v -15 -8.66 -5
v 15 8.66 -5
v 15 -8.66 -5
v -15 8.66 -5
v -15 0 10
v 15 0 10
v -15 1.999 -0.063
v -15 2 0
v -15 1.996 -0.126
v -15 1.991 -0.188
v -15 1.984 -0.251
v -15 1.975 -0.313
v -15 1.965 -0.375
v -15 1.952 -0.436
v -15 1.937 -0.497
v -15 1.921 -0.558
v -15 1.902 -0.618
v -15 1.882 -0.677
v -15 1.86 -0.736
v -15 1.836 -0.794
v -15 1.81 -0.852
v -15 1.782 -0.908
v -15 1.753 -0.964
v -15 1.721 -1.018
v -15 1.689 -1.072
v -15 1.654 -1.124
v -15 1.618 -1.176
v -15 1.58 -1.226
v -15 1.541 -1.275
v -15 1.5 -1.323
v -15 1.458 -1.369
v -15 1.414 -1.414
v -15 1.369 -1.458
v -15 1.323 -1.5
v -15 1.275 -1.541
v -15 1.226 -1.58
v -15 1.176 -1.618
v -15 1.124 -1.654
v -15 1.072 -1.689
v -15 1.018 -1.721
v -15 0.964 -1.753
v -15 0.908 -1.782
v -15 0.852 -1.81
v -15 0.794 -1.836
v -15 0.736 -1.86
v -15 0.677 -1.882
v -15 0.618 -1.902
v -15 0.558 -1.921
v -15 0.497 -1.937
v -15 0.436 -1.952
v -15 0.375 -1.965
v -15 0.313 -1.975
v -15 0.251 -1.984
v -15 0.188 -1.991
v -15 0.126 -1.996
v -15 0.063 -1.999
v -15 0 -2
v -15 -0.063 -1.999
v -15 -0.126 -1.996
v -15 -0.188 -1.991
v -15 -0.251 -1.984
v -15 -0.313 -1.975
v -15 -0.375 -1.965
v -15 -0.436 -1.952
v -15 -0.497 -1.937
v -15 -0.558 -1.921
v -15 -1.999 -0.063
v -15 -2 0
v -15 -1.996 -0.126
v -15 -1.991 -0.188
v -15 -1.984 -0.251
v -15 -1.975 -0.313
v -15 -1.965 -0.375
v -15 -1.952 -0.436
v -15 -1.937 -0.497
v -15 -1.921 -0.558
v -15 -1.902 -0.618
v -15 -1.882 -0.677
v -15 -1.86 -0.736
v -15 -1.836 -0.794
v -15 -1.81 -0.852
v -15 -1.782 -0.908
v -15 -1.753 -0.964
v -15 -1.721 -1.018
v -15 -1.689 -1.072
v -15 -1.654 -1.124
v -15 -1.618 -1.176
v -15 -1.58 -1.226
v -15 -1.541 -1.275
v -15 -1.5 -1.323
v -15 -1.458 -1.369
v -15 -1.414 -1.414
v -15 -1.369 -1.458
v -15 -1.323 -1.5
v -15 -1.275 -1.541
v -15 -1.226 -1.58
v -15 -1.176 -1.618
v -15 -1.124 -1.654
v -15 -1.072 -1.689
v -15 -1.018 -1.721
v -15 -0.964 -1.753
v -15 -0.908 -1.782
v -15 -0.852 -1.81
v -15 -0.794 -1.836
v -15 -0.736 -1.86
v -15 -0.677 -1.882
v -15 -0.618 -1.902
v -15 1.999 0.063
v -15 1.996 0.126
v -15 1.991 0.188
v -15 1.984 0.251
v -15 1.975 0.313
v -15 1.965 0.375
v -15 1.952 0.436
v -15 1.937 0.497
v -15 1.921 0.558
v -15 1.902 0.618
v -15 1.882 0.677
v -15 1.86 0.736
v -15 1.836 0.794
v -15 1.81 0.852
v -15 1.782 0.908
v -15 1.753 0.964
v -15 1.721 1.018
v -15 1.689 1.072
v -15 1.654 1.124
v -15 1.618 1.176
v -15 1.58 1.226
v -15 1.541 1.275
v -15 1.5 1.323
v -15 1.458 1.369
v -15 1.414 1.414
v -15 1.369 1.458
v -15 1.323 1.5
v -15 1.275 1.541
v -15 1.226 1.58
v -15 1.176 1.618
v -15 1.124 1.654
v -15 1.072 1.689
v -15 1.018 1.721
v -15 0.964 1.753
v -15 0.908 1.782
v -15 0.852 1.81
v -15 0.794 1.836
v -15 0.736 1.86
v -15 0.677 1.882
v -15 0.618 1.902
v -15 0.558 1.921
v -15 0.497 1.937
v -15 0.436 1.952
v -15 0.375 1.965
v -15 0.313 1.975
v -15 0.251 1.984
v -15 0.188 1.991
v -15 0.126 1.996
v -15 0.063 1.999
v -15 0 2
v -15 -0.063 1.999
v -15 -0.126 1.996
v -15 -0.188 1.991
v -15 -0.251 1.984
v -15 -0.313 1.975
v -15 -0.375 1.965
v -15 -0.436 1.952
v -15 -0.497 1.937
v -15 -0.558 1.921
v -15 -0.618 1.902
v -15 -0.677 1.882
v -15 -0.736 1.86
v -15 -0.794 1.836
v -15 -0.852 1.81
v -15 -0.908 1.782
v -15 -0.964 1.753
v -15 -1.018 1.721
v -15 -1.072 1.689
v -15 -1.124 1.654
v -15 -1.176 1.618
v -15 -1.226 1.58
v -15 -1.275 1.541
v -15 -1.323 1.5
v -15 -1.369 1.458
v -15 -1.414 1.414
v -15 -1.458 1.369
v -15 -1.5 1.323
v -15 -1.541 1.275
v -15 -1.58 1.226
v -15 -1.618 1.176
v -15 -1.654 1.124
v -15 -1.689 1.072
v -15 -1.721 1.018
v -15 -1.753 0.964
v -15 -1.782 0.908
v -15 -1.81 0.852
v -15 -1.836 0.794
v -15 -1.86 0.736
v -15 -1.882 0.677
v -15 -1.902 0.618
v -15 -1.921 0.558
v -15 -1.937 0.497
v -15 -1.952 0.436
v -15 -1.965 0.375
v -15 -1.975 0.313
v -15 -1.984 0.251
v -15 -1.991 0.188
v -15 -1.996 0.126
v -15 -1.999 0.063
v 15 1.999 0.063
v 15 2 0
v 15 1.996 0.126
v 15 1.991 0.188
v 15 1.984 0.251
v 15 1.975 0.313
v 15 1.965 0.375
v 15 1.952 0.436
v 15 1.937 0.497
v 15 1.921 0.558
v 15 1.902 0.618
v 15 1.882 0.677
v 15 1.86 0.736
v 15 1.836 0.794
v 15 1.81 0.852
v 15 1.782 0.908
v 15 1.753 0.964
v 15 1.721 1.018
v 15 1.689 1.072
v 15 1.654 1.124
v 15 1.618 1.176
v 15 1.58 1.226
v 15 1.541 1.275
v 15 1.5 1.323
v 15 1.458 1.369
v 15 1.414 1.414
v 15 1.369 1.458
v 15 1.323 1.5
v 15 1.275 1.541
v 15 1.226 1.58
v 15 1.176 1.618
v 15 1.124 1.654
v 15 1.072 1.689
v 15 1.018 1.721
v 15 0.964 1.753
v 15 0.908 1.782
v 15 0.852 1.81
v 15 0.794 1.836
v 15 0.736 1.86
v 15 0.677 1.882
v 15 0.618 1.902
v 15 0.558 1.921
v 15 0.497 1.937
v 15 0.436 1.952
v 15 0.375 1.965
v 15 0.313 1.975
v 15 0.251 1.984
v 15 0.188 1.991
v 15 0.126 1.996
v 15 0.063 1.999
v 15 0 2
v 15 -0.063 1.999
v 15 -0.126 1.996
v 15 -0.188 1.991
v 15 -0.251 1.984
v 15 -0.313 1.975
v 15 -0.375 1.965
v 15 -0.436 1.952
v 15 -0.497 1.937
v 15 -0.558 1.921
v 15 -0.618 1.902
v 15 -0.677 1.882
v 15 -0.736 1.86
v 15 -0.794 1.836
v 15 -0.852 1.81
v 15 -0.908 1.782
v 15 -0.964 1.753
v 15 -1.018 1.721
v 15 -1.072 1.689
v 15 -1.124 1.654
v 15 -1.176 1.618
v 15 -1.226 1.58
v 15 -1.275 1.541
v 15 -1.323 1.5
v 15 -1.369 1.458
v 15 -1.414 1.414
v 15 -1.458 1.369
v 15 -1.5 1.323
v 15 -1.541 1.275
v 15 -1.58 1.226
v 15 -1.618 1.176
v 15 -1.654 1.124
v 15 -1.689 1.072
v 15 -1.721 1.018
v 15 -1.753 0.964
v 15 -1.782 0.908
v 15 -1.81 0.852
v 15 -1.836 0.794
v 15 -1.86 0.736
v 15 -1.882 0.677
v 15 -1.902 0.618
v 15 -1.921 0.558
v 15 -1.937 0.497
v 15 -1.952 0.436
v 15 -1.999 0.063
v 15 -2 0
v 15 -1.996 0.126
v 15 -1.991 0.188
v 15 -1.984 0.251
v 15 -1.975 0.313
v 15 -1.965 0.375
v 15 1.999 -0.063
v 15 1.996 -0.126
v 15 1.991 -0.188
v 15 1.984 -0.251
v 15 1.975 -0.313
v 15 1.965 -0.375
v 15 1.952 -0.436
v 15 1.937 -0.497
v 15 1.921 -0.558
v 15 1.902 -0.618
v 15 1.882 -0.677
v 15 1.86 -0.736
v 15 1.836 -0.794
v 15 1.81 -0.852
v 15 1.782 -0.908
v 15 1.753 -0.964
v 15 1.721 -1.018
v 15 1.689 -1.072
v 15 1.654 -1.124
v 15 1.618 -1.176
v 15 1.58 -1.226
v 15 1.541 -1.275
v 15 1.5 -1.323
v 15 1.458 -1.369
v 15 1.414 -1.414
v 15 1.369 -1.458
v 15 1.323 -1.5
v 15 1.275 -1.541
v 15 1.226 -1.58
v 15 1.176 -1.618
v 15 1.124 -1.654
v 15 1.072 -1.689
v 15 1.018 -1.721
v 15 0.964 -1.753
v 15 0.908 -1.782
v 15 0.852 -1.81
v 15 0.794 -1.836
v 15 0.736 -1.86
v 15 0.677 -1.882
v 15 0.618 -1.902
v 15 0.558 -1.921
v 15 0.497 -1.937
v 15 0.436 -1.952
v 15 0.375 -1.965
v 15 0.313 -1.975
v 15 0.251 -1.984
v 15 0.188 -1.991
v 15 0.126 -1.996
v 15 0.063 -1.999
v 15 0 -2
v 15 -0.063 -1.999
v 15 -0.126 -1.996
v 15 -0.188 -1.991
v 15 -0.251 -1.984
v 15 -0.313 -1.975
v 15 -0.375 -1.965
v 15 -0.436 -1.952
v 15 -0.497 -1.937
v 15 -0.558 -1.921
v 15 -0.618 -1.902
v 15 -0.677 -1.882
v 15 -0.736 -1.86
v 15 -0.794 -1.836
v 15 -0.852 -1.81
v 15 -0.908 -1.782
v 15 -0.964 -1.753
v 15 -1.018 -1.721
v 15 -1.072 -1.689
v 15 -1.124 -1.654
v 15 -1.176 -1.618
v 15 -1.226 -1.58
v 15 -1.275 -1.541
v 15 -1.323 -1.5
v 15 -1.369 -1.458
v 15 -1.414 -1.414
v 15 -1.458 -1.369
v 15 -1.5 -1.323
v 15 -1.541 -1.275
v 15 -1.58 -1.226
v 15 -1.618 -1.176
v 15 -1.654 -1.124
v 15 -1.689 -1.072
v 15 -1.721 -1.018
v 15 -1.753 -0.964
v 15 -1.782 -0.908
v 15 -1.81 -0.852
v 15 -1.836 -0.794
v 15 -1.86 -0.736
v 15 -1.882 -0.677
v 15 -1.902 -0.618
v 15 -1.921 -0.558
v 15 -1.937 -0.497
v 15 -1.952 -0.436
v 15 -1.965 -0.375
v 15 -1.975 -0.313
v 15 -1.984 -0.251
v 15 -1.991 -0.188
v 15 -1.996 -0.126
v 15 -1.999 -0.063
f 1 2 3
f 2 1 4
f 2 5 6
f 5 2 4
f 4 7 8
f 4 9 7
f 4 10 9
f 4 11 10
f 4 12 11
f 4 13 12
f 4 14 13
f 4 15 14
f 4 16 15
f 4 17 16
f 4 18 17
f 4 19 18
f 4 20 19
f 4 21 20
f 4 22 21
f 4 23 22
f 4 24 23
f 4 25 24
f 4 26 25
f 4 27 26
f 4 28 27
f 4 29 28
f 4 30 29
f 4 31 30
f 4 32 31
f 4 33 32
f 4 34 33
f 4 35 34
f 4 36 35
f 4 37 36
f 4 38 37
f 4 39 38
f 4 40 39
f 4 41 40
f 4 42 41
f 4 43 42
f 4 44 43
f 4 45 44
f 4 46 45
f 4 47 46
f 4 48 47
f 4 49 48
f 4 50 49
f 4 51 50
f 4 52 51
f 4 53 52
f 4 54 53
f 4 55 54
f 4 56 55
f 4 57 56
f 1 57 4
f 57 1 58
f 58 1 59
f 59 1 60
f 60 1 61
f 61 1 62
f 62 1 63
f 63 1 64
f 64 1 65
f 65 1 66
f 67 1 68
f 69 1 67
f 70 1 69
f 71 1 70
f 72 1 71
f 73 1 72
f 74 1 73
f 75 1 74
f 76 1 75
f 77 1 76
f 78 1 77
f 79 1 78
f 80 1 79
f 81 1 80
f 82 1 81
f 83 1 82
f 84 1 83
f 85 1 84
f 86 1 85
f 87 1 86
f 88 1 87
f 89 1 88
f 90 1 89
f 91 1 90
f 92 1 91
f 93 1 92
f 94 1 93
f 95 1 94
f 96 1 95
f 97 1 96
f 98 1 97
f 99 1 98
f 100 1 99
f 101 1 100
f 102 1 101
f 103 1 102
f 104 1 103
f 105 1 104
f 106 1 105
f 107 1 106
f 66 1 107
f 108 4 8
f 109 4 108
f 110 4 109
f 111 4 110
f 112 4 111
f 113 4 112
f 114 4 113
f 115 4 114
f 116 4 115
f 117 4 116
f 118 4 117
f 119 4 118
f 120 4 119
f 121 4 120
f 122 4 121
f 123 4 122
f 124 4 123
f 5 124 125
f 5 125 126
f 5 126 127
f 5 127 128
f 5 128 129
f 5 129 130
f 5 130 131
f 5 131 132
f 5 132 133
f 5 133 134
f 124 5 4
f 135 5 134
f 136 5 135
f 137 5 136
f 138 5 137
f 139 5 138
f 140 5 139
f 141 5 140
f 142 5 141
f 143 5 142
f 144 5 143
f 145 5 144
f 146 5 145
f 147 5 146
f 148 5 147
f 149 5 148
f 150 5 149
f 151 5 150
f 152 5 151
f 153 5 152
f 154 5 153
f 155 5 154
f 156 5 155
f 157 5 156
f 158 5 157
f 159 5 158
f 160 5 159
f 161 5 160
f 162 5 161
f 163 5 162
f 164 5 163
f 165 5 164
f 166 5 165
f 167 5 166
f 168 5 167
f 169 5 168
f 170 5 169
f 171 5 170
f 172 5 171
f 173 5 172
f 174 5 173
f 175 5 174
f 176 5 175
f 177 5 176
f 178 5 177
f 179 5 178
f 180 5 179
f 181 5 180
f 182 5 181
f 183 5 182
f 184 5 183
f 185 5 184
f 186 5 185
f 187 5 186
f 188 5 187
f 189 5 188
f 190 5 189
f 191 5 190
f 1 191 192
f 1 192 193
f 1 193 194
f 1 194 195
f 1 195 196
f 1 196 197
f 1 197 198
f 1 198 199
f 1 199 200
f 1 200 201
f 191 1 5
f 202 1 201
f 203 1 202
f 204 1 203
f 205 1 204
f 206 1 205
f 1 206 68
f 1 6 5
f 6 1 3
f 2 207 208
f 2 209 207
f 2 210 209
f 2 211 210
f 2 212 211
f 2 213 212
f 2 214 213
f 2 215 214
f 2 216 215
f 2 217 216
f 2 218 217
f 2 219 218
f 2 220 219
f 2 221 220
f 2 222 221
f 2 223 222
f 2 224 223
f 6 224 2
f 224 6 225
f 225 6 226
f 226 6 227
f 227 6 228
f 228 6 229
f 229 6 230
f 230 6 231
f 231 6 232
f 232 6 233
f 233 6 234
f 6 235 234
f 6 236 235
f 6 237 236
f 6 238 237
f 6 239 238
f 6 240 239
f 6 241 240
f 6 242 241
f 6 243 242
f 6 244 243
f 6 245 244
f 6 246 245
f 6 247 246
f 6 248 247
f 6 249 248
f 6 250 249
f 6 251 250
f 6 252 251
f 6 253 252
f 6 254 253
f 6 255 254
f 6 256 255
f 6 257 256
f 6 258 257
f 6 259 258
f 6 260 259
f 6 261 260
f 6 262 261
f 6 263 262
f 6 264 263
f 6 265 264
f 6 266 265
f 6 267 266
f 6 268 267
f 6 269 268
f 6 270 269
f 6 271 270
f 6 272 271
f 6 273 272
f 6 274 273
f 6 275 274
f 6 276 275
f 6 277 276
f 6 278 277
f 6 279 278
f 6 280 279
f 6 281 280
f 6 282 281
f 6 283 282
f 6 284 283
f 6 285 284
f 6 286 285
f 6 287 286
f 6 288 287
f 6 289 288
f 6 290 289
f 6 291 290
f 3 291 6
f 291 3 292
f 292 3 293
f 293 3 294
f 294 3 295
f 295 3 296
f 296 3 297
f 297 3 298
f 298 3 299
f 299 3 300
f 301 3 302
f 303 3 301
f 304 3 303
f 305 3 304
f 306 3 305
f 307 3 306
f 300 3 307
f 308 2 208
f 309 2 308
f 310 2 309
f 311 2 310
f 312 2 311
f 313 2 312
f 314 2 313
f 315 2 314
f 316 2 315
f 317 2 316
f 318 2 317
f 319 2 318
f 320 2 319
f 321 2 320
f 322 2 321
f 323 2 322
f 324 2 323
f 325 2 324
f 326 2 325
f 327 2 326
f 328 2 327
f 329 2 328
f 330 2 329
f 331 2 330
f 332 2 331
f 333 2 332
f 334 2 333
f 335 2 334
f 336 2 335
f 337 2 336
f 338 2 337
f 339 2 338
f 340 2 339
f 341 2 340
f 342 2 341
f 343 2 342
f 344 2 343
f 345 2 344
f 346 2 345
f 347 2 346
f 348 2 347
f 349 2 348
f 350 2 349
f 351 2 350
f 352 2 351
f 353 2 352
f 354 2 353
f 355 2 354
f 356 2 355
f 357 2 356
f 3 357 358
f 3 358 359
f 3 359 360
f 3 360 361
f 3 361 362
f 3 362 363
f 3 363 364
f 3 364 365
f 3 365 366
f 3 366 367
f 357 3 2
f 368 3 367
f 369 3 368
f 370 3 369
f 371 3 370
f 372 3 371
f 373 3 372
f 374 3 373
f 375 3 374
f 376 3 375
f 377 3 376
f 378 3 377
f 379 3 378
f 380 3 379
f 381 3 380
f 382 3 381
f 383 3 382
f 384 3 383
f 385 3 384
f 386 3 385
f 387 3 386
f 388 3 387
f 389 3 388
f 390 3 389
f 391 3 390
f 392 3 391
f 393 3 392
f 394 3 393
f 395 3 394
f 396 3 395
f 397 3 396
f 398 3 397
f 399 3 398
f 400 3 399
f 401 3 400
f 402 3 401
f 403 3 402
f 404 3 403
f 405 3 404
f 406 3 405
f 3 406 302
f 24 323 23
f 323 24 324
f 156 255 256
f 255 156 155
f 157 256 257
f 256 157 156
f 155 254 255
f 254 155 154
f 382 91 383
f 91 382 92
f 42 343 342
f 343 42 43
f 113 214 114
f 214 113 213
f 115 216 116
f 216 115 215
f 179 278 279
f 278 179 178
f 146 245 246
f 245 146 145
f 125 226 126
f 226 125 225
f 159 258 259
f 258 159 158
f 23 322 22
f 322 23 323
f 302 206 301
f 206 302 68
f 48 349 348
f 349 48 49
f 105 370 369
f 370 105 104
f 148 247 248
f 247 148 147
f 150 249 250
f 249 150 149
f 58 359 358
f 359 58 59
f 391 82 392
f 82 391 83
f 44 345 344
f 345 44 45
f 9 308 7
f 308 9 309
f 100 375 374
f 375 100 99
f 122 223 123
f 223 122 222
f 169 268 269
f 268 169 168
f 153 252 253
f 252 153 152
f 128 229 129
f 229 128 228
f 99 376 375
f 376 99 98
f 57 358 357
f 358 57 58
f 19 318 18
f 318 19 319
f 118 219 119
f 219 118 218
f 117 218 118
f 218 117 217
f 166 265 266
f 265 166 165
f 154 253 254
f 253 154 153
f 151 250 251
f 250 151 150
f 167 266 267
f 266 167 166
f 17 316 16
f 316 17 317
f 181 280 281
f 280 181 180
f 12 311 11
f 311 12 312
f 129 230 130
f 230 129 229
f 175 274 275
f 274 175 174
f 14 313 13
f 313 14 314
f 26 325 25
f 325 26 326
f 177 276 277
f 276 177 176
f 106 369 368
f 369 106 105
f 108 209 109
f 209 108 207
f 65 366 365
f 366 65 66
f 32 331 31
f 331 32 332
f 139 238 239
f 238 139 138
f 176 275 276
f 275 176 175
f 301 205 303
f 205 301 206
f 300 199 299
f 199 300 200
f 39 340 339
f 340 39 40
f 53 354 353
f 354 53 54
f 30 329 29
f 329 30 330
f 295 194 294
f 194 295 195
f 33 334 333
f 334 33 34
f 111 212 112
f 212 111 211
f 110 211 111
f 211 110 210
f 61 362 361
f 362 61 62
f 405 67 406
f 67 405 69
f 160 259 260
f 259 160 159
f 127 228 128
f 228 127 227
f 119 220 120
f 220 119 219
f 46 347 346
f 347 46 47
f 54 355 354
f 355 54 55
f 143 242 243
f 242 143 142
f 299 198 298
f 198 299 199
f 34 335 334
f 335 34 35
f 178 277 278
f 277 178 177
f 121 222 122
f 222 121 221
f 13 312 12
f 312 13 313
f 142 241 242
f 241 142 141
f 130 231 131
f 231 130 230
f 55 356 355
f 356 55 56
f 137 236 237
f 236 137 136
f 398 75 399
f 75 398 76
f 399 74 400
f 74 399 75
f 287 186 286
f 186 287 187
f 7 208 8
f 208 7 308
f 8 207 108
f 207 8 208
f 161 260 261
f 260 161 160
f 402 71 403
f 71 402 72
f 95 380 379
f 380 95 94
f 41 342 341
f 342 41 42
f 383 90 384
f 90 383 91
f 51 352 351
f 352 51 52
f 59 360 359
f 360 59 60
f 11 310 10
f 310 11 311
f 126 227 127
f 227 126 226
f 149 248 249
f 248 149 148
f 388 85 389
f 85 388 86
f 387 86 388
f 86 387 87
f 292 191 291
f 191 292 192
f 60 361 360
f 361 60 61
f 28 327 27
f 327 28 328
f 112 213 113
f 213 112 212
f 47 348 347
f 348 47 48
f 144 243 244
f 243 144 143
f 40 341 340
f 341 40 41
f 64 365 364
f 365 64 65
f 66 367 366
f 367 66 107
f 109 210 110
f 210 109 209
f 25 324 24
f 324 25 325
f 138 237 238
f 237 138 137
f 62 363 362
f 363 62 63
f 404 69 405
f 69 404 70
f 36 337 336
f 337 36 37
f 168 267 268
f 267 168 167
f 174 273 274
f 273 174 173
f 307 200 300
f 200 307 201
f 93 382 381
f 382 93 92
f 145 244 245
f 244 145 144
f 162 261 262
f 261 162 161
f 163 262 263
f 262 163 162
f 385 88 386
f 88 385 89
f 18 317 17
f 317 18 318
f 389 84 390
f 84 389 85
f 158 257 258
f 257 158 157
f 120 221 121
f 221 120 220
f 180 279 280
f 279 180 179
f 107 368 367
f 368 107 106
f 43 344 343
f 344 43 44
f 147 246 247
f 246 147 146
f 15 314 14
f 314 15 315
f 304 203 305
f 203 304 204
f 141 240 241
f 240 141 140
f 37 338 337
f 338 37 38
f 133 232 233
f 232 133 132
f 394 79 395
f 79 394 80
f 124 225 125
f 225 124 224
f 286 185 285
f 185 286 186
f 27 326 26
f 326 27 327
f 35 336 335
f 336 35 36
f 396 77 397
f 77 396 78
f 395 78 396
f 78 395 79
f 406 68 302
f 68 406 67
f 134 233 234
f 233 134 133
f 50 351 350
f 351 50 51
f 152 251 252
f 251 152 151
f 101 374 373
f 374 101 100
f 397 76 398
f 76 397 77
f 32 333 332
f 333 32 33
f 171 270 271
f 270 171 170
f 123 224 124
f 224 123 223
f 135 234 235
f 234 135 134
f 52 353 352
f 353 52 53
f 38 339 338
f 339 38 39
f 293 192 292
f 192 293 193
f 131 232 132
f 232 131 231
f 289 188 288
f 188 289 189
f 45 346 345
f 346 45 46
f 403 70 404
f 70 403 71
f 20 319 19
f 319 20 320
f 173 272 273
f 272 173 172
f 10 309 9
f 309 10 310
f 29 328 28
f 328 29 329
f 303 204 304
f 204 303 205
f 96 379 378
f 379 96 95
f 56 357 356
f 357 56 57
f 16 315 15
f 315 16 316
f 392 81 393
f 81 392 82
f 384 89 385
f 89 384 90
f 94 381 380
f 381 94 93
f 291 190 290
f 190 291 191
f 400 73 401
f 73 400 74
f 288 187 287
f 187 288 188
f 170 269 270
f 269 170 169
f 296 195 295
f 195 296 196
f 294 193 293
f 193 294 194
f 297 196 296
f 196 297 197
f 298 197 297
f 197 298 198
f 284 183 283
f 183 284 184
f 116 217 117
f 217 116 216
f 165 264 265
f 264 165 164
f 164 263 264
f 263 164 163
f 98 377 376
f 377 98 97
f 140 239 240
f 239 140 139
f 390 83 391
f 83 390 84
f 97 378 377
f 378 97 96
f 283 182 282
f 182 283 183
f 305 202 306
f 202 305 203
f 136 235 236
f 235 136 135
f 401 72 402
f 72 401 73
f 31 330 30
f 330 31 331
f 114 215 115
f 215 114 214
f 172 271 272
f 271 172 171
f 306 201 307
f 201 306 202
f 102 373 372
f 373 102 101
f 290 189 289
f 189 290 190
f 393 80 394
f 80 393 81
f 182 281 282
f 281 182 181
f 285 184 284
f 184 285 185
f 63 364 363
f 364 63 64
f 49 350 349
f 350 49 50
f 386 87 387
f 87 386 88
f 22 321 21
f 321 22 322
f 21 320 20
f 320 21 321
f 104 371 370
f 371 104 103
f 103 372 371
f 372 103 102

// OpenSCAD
$fn=200;
height=30;
side=10;
axis_diameter=4;

rotate([0,270,0])
difference() {
    cylinder(height,side,side, $fn=3, center=true);

    cylinder(h=height*2, r=axis_diameter/2, center=true);
}
